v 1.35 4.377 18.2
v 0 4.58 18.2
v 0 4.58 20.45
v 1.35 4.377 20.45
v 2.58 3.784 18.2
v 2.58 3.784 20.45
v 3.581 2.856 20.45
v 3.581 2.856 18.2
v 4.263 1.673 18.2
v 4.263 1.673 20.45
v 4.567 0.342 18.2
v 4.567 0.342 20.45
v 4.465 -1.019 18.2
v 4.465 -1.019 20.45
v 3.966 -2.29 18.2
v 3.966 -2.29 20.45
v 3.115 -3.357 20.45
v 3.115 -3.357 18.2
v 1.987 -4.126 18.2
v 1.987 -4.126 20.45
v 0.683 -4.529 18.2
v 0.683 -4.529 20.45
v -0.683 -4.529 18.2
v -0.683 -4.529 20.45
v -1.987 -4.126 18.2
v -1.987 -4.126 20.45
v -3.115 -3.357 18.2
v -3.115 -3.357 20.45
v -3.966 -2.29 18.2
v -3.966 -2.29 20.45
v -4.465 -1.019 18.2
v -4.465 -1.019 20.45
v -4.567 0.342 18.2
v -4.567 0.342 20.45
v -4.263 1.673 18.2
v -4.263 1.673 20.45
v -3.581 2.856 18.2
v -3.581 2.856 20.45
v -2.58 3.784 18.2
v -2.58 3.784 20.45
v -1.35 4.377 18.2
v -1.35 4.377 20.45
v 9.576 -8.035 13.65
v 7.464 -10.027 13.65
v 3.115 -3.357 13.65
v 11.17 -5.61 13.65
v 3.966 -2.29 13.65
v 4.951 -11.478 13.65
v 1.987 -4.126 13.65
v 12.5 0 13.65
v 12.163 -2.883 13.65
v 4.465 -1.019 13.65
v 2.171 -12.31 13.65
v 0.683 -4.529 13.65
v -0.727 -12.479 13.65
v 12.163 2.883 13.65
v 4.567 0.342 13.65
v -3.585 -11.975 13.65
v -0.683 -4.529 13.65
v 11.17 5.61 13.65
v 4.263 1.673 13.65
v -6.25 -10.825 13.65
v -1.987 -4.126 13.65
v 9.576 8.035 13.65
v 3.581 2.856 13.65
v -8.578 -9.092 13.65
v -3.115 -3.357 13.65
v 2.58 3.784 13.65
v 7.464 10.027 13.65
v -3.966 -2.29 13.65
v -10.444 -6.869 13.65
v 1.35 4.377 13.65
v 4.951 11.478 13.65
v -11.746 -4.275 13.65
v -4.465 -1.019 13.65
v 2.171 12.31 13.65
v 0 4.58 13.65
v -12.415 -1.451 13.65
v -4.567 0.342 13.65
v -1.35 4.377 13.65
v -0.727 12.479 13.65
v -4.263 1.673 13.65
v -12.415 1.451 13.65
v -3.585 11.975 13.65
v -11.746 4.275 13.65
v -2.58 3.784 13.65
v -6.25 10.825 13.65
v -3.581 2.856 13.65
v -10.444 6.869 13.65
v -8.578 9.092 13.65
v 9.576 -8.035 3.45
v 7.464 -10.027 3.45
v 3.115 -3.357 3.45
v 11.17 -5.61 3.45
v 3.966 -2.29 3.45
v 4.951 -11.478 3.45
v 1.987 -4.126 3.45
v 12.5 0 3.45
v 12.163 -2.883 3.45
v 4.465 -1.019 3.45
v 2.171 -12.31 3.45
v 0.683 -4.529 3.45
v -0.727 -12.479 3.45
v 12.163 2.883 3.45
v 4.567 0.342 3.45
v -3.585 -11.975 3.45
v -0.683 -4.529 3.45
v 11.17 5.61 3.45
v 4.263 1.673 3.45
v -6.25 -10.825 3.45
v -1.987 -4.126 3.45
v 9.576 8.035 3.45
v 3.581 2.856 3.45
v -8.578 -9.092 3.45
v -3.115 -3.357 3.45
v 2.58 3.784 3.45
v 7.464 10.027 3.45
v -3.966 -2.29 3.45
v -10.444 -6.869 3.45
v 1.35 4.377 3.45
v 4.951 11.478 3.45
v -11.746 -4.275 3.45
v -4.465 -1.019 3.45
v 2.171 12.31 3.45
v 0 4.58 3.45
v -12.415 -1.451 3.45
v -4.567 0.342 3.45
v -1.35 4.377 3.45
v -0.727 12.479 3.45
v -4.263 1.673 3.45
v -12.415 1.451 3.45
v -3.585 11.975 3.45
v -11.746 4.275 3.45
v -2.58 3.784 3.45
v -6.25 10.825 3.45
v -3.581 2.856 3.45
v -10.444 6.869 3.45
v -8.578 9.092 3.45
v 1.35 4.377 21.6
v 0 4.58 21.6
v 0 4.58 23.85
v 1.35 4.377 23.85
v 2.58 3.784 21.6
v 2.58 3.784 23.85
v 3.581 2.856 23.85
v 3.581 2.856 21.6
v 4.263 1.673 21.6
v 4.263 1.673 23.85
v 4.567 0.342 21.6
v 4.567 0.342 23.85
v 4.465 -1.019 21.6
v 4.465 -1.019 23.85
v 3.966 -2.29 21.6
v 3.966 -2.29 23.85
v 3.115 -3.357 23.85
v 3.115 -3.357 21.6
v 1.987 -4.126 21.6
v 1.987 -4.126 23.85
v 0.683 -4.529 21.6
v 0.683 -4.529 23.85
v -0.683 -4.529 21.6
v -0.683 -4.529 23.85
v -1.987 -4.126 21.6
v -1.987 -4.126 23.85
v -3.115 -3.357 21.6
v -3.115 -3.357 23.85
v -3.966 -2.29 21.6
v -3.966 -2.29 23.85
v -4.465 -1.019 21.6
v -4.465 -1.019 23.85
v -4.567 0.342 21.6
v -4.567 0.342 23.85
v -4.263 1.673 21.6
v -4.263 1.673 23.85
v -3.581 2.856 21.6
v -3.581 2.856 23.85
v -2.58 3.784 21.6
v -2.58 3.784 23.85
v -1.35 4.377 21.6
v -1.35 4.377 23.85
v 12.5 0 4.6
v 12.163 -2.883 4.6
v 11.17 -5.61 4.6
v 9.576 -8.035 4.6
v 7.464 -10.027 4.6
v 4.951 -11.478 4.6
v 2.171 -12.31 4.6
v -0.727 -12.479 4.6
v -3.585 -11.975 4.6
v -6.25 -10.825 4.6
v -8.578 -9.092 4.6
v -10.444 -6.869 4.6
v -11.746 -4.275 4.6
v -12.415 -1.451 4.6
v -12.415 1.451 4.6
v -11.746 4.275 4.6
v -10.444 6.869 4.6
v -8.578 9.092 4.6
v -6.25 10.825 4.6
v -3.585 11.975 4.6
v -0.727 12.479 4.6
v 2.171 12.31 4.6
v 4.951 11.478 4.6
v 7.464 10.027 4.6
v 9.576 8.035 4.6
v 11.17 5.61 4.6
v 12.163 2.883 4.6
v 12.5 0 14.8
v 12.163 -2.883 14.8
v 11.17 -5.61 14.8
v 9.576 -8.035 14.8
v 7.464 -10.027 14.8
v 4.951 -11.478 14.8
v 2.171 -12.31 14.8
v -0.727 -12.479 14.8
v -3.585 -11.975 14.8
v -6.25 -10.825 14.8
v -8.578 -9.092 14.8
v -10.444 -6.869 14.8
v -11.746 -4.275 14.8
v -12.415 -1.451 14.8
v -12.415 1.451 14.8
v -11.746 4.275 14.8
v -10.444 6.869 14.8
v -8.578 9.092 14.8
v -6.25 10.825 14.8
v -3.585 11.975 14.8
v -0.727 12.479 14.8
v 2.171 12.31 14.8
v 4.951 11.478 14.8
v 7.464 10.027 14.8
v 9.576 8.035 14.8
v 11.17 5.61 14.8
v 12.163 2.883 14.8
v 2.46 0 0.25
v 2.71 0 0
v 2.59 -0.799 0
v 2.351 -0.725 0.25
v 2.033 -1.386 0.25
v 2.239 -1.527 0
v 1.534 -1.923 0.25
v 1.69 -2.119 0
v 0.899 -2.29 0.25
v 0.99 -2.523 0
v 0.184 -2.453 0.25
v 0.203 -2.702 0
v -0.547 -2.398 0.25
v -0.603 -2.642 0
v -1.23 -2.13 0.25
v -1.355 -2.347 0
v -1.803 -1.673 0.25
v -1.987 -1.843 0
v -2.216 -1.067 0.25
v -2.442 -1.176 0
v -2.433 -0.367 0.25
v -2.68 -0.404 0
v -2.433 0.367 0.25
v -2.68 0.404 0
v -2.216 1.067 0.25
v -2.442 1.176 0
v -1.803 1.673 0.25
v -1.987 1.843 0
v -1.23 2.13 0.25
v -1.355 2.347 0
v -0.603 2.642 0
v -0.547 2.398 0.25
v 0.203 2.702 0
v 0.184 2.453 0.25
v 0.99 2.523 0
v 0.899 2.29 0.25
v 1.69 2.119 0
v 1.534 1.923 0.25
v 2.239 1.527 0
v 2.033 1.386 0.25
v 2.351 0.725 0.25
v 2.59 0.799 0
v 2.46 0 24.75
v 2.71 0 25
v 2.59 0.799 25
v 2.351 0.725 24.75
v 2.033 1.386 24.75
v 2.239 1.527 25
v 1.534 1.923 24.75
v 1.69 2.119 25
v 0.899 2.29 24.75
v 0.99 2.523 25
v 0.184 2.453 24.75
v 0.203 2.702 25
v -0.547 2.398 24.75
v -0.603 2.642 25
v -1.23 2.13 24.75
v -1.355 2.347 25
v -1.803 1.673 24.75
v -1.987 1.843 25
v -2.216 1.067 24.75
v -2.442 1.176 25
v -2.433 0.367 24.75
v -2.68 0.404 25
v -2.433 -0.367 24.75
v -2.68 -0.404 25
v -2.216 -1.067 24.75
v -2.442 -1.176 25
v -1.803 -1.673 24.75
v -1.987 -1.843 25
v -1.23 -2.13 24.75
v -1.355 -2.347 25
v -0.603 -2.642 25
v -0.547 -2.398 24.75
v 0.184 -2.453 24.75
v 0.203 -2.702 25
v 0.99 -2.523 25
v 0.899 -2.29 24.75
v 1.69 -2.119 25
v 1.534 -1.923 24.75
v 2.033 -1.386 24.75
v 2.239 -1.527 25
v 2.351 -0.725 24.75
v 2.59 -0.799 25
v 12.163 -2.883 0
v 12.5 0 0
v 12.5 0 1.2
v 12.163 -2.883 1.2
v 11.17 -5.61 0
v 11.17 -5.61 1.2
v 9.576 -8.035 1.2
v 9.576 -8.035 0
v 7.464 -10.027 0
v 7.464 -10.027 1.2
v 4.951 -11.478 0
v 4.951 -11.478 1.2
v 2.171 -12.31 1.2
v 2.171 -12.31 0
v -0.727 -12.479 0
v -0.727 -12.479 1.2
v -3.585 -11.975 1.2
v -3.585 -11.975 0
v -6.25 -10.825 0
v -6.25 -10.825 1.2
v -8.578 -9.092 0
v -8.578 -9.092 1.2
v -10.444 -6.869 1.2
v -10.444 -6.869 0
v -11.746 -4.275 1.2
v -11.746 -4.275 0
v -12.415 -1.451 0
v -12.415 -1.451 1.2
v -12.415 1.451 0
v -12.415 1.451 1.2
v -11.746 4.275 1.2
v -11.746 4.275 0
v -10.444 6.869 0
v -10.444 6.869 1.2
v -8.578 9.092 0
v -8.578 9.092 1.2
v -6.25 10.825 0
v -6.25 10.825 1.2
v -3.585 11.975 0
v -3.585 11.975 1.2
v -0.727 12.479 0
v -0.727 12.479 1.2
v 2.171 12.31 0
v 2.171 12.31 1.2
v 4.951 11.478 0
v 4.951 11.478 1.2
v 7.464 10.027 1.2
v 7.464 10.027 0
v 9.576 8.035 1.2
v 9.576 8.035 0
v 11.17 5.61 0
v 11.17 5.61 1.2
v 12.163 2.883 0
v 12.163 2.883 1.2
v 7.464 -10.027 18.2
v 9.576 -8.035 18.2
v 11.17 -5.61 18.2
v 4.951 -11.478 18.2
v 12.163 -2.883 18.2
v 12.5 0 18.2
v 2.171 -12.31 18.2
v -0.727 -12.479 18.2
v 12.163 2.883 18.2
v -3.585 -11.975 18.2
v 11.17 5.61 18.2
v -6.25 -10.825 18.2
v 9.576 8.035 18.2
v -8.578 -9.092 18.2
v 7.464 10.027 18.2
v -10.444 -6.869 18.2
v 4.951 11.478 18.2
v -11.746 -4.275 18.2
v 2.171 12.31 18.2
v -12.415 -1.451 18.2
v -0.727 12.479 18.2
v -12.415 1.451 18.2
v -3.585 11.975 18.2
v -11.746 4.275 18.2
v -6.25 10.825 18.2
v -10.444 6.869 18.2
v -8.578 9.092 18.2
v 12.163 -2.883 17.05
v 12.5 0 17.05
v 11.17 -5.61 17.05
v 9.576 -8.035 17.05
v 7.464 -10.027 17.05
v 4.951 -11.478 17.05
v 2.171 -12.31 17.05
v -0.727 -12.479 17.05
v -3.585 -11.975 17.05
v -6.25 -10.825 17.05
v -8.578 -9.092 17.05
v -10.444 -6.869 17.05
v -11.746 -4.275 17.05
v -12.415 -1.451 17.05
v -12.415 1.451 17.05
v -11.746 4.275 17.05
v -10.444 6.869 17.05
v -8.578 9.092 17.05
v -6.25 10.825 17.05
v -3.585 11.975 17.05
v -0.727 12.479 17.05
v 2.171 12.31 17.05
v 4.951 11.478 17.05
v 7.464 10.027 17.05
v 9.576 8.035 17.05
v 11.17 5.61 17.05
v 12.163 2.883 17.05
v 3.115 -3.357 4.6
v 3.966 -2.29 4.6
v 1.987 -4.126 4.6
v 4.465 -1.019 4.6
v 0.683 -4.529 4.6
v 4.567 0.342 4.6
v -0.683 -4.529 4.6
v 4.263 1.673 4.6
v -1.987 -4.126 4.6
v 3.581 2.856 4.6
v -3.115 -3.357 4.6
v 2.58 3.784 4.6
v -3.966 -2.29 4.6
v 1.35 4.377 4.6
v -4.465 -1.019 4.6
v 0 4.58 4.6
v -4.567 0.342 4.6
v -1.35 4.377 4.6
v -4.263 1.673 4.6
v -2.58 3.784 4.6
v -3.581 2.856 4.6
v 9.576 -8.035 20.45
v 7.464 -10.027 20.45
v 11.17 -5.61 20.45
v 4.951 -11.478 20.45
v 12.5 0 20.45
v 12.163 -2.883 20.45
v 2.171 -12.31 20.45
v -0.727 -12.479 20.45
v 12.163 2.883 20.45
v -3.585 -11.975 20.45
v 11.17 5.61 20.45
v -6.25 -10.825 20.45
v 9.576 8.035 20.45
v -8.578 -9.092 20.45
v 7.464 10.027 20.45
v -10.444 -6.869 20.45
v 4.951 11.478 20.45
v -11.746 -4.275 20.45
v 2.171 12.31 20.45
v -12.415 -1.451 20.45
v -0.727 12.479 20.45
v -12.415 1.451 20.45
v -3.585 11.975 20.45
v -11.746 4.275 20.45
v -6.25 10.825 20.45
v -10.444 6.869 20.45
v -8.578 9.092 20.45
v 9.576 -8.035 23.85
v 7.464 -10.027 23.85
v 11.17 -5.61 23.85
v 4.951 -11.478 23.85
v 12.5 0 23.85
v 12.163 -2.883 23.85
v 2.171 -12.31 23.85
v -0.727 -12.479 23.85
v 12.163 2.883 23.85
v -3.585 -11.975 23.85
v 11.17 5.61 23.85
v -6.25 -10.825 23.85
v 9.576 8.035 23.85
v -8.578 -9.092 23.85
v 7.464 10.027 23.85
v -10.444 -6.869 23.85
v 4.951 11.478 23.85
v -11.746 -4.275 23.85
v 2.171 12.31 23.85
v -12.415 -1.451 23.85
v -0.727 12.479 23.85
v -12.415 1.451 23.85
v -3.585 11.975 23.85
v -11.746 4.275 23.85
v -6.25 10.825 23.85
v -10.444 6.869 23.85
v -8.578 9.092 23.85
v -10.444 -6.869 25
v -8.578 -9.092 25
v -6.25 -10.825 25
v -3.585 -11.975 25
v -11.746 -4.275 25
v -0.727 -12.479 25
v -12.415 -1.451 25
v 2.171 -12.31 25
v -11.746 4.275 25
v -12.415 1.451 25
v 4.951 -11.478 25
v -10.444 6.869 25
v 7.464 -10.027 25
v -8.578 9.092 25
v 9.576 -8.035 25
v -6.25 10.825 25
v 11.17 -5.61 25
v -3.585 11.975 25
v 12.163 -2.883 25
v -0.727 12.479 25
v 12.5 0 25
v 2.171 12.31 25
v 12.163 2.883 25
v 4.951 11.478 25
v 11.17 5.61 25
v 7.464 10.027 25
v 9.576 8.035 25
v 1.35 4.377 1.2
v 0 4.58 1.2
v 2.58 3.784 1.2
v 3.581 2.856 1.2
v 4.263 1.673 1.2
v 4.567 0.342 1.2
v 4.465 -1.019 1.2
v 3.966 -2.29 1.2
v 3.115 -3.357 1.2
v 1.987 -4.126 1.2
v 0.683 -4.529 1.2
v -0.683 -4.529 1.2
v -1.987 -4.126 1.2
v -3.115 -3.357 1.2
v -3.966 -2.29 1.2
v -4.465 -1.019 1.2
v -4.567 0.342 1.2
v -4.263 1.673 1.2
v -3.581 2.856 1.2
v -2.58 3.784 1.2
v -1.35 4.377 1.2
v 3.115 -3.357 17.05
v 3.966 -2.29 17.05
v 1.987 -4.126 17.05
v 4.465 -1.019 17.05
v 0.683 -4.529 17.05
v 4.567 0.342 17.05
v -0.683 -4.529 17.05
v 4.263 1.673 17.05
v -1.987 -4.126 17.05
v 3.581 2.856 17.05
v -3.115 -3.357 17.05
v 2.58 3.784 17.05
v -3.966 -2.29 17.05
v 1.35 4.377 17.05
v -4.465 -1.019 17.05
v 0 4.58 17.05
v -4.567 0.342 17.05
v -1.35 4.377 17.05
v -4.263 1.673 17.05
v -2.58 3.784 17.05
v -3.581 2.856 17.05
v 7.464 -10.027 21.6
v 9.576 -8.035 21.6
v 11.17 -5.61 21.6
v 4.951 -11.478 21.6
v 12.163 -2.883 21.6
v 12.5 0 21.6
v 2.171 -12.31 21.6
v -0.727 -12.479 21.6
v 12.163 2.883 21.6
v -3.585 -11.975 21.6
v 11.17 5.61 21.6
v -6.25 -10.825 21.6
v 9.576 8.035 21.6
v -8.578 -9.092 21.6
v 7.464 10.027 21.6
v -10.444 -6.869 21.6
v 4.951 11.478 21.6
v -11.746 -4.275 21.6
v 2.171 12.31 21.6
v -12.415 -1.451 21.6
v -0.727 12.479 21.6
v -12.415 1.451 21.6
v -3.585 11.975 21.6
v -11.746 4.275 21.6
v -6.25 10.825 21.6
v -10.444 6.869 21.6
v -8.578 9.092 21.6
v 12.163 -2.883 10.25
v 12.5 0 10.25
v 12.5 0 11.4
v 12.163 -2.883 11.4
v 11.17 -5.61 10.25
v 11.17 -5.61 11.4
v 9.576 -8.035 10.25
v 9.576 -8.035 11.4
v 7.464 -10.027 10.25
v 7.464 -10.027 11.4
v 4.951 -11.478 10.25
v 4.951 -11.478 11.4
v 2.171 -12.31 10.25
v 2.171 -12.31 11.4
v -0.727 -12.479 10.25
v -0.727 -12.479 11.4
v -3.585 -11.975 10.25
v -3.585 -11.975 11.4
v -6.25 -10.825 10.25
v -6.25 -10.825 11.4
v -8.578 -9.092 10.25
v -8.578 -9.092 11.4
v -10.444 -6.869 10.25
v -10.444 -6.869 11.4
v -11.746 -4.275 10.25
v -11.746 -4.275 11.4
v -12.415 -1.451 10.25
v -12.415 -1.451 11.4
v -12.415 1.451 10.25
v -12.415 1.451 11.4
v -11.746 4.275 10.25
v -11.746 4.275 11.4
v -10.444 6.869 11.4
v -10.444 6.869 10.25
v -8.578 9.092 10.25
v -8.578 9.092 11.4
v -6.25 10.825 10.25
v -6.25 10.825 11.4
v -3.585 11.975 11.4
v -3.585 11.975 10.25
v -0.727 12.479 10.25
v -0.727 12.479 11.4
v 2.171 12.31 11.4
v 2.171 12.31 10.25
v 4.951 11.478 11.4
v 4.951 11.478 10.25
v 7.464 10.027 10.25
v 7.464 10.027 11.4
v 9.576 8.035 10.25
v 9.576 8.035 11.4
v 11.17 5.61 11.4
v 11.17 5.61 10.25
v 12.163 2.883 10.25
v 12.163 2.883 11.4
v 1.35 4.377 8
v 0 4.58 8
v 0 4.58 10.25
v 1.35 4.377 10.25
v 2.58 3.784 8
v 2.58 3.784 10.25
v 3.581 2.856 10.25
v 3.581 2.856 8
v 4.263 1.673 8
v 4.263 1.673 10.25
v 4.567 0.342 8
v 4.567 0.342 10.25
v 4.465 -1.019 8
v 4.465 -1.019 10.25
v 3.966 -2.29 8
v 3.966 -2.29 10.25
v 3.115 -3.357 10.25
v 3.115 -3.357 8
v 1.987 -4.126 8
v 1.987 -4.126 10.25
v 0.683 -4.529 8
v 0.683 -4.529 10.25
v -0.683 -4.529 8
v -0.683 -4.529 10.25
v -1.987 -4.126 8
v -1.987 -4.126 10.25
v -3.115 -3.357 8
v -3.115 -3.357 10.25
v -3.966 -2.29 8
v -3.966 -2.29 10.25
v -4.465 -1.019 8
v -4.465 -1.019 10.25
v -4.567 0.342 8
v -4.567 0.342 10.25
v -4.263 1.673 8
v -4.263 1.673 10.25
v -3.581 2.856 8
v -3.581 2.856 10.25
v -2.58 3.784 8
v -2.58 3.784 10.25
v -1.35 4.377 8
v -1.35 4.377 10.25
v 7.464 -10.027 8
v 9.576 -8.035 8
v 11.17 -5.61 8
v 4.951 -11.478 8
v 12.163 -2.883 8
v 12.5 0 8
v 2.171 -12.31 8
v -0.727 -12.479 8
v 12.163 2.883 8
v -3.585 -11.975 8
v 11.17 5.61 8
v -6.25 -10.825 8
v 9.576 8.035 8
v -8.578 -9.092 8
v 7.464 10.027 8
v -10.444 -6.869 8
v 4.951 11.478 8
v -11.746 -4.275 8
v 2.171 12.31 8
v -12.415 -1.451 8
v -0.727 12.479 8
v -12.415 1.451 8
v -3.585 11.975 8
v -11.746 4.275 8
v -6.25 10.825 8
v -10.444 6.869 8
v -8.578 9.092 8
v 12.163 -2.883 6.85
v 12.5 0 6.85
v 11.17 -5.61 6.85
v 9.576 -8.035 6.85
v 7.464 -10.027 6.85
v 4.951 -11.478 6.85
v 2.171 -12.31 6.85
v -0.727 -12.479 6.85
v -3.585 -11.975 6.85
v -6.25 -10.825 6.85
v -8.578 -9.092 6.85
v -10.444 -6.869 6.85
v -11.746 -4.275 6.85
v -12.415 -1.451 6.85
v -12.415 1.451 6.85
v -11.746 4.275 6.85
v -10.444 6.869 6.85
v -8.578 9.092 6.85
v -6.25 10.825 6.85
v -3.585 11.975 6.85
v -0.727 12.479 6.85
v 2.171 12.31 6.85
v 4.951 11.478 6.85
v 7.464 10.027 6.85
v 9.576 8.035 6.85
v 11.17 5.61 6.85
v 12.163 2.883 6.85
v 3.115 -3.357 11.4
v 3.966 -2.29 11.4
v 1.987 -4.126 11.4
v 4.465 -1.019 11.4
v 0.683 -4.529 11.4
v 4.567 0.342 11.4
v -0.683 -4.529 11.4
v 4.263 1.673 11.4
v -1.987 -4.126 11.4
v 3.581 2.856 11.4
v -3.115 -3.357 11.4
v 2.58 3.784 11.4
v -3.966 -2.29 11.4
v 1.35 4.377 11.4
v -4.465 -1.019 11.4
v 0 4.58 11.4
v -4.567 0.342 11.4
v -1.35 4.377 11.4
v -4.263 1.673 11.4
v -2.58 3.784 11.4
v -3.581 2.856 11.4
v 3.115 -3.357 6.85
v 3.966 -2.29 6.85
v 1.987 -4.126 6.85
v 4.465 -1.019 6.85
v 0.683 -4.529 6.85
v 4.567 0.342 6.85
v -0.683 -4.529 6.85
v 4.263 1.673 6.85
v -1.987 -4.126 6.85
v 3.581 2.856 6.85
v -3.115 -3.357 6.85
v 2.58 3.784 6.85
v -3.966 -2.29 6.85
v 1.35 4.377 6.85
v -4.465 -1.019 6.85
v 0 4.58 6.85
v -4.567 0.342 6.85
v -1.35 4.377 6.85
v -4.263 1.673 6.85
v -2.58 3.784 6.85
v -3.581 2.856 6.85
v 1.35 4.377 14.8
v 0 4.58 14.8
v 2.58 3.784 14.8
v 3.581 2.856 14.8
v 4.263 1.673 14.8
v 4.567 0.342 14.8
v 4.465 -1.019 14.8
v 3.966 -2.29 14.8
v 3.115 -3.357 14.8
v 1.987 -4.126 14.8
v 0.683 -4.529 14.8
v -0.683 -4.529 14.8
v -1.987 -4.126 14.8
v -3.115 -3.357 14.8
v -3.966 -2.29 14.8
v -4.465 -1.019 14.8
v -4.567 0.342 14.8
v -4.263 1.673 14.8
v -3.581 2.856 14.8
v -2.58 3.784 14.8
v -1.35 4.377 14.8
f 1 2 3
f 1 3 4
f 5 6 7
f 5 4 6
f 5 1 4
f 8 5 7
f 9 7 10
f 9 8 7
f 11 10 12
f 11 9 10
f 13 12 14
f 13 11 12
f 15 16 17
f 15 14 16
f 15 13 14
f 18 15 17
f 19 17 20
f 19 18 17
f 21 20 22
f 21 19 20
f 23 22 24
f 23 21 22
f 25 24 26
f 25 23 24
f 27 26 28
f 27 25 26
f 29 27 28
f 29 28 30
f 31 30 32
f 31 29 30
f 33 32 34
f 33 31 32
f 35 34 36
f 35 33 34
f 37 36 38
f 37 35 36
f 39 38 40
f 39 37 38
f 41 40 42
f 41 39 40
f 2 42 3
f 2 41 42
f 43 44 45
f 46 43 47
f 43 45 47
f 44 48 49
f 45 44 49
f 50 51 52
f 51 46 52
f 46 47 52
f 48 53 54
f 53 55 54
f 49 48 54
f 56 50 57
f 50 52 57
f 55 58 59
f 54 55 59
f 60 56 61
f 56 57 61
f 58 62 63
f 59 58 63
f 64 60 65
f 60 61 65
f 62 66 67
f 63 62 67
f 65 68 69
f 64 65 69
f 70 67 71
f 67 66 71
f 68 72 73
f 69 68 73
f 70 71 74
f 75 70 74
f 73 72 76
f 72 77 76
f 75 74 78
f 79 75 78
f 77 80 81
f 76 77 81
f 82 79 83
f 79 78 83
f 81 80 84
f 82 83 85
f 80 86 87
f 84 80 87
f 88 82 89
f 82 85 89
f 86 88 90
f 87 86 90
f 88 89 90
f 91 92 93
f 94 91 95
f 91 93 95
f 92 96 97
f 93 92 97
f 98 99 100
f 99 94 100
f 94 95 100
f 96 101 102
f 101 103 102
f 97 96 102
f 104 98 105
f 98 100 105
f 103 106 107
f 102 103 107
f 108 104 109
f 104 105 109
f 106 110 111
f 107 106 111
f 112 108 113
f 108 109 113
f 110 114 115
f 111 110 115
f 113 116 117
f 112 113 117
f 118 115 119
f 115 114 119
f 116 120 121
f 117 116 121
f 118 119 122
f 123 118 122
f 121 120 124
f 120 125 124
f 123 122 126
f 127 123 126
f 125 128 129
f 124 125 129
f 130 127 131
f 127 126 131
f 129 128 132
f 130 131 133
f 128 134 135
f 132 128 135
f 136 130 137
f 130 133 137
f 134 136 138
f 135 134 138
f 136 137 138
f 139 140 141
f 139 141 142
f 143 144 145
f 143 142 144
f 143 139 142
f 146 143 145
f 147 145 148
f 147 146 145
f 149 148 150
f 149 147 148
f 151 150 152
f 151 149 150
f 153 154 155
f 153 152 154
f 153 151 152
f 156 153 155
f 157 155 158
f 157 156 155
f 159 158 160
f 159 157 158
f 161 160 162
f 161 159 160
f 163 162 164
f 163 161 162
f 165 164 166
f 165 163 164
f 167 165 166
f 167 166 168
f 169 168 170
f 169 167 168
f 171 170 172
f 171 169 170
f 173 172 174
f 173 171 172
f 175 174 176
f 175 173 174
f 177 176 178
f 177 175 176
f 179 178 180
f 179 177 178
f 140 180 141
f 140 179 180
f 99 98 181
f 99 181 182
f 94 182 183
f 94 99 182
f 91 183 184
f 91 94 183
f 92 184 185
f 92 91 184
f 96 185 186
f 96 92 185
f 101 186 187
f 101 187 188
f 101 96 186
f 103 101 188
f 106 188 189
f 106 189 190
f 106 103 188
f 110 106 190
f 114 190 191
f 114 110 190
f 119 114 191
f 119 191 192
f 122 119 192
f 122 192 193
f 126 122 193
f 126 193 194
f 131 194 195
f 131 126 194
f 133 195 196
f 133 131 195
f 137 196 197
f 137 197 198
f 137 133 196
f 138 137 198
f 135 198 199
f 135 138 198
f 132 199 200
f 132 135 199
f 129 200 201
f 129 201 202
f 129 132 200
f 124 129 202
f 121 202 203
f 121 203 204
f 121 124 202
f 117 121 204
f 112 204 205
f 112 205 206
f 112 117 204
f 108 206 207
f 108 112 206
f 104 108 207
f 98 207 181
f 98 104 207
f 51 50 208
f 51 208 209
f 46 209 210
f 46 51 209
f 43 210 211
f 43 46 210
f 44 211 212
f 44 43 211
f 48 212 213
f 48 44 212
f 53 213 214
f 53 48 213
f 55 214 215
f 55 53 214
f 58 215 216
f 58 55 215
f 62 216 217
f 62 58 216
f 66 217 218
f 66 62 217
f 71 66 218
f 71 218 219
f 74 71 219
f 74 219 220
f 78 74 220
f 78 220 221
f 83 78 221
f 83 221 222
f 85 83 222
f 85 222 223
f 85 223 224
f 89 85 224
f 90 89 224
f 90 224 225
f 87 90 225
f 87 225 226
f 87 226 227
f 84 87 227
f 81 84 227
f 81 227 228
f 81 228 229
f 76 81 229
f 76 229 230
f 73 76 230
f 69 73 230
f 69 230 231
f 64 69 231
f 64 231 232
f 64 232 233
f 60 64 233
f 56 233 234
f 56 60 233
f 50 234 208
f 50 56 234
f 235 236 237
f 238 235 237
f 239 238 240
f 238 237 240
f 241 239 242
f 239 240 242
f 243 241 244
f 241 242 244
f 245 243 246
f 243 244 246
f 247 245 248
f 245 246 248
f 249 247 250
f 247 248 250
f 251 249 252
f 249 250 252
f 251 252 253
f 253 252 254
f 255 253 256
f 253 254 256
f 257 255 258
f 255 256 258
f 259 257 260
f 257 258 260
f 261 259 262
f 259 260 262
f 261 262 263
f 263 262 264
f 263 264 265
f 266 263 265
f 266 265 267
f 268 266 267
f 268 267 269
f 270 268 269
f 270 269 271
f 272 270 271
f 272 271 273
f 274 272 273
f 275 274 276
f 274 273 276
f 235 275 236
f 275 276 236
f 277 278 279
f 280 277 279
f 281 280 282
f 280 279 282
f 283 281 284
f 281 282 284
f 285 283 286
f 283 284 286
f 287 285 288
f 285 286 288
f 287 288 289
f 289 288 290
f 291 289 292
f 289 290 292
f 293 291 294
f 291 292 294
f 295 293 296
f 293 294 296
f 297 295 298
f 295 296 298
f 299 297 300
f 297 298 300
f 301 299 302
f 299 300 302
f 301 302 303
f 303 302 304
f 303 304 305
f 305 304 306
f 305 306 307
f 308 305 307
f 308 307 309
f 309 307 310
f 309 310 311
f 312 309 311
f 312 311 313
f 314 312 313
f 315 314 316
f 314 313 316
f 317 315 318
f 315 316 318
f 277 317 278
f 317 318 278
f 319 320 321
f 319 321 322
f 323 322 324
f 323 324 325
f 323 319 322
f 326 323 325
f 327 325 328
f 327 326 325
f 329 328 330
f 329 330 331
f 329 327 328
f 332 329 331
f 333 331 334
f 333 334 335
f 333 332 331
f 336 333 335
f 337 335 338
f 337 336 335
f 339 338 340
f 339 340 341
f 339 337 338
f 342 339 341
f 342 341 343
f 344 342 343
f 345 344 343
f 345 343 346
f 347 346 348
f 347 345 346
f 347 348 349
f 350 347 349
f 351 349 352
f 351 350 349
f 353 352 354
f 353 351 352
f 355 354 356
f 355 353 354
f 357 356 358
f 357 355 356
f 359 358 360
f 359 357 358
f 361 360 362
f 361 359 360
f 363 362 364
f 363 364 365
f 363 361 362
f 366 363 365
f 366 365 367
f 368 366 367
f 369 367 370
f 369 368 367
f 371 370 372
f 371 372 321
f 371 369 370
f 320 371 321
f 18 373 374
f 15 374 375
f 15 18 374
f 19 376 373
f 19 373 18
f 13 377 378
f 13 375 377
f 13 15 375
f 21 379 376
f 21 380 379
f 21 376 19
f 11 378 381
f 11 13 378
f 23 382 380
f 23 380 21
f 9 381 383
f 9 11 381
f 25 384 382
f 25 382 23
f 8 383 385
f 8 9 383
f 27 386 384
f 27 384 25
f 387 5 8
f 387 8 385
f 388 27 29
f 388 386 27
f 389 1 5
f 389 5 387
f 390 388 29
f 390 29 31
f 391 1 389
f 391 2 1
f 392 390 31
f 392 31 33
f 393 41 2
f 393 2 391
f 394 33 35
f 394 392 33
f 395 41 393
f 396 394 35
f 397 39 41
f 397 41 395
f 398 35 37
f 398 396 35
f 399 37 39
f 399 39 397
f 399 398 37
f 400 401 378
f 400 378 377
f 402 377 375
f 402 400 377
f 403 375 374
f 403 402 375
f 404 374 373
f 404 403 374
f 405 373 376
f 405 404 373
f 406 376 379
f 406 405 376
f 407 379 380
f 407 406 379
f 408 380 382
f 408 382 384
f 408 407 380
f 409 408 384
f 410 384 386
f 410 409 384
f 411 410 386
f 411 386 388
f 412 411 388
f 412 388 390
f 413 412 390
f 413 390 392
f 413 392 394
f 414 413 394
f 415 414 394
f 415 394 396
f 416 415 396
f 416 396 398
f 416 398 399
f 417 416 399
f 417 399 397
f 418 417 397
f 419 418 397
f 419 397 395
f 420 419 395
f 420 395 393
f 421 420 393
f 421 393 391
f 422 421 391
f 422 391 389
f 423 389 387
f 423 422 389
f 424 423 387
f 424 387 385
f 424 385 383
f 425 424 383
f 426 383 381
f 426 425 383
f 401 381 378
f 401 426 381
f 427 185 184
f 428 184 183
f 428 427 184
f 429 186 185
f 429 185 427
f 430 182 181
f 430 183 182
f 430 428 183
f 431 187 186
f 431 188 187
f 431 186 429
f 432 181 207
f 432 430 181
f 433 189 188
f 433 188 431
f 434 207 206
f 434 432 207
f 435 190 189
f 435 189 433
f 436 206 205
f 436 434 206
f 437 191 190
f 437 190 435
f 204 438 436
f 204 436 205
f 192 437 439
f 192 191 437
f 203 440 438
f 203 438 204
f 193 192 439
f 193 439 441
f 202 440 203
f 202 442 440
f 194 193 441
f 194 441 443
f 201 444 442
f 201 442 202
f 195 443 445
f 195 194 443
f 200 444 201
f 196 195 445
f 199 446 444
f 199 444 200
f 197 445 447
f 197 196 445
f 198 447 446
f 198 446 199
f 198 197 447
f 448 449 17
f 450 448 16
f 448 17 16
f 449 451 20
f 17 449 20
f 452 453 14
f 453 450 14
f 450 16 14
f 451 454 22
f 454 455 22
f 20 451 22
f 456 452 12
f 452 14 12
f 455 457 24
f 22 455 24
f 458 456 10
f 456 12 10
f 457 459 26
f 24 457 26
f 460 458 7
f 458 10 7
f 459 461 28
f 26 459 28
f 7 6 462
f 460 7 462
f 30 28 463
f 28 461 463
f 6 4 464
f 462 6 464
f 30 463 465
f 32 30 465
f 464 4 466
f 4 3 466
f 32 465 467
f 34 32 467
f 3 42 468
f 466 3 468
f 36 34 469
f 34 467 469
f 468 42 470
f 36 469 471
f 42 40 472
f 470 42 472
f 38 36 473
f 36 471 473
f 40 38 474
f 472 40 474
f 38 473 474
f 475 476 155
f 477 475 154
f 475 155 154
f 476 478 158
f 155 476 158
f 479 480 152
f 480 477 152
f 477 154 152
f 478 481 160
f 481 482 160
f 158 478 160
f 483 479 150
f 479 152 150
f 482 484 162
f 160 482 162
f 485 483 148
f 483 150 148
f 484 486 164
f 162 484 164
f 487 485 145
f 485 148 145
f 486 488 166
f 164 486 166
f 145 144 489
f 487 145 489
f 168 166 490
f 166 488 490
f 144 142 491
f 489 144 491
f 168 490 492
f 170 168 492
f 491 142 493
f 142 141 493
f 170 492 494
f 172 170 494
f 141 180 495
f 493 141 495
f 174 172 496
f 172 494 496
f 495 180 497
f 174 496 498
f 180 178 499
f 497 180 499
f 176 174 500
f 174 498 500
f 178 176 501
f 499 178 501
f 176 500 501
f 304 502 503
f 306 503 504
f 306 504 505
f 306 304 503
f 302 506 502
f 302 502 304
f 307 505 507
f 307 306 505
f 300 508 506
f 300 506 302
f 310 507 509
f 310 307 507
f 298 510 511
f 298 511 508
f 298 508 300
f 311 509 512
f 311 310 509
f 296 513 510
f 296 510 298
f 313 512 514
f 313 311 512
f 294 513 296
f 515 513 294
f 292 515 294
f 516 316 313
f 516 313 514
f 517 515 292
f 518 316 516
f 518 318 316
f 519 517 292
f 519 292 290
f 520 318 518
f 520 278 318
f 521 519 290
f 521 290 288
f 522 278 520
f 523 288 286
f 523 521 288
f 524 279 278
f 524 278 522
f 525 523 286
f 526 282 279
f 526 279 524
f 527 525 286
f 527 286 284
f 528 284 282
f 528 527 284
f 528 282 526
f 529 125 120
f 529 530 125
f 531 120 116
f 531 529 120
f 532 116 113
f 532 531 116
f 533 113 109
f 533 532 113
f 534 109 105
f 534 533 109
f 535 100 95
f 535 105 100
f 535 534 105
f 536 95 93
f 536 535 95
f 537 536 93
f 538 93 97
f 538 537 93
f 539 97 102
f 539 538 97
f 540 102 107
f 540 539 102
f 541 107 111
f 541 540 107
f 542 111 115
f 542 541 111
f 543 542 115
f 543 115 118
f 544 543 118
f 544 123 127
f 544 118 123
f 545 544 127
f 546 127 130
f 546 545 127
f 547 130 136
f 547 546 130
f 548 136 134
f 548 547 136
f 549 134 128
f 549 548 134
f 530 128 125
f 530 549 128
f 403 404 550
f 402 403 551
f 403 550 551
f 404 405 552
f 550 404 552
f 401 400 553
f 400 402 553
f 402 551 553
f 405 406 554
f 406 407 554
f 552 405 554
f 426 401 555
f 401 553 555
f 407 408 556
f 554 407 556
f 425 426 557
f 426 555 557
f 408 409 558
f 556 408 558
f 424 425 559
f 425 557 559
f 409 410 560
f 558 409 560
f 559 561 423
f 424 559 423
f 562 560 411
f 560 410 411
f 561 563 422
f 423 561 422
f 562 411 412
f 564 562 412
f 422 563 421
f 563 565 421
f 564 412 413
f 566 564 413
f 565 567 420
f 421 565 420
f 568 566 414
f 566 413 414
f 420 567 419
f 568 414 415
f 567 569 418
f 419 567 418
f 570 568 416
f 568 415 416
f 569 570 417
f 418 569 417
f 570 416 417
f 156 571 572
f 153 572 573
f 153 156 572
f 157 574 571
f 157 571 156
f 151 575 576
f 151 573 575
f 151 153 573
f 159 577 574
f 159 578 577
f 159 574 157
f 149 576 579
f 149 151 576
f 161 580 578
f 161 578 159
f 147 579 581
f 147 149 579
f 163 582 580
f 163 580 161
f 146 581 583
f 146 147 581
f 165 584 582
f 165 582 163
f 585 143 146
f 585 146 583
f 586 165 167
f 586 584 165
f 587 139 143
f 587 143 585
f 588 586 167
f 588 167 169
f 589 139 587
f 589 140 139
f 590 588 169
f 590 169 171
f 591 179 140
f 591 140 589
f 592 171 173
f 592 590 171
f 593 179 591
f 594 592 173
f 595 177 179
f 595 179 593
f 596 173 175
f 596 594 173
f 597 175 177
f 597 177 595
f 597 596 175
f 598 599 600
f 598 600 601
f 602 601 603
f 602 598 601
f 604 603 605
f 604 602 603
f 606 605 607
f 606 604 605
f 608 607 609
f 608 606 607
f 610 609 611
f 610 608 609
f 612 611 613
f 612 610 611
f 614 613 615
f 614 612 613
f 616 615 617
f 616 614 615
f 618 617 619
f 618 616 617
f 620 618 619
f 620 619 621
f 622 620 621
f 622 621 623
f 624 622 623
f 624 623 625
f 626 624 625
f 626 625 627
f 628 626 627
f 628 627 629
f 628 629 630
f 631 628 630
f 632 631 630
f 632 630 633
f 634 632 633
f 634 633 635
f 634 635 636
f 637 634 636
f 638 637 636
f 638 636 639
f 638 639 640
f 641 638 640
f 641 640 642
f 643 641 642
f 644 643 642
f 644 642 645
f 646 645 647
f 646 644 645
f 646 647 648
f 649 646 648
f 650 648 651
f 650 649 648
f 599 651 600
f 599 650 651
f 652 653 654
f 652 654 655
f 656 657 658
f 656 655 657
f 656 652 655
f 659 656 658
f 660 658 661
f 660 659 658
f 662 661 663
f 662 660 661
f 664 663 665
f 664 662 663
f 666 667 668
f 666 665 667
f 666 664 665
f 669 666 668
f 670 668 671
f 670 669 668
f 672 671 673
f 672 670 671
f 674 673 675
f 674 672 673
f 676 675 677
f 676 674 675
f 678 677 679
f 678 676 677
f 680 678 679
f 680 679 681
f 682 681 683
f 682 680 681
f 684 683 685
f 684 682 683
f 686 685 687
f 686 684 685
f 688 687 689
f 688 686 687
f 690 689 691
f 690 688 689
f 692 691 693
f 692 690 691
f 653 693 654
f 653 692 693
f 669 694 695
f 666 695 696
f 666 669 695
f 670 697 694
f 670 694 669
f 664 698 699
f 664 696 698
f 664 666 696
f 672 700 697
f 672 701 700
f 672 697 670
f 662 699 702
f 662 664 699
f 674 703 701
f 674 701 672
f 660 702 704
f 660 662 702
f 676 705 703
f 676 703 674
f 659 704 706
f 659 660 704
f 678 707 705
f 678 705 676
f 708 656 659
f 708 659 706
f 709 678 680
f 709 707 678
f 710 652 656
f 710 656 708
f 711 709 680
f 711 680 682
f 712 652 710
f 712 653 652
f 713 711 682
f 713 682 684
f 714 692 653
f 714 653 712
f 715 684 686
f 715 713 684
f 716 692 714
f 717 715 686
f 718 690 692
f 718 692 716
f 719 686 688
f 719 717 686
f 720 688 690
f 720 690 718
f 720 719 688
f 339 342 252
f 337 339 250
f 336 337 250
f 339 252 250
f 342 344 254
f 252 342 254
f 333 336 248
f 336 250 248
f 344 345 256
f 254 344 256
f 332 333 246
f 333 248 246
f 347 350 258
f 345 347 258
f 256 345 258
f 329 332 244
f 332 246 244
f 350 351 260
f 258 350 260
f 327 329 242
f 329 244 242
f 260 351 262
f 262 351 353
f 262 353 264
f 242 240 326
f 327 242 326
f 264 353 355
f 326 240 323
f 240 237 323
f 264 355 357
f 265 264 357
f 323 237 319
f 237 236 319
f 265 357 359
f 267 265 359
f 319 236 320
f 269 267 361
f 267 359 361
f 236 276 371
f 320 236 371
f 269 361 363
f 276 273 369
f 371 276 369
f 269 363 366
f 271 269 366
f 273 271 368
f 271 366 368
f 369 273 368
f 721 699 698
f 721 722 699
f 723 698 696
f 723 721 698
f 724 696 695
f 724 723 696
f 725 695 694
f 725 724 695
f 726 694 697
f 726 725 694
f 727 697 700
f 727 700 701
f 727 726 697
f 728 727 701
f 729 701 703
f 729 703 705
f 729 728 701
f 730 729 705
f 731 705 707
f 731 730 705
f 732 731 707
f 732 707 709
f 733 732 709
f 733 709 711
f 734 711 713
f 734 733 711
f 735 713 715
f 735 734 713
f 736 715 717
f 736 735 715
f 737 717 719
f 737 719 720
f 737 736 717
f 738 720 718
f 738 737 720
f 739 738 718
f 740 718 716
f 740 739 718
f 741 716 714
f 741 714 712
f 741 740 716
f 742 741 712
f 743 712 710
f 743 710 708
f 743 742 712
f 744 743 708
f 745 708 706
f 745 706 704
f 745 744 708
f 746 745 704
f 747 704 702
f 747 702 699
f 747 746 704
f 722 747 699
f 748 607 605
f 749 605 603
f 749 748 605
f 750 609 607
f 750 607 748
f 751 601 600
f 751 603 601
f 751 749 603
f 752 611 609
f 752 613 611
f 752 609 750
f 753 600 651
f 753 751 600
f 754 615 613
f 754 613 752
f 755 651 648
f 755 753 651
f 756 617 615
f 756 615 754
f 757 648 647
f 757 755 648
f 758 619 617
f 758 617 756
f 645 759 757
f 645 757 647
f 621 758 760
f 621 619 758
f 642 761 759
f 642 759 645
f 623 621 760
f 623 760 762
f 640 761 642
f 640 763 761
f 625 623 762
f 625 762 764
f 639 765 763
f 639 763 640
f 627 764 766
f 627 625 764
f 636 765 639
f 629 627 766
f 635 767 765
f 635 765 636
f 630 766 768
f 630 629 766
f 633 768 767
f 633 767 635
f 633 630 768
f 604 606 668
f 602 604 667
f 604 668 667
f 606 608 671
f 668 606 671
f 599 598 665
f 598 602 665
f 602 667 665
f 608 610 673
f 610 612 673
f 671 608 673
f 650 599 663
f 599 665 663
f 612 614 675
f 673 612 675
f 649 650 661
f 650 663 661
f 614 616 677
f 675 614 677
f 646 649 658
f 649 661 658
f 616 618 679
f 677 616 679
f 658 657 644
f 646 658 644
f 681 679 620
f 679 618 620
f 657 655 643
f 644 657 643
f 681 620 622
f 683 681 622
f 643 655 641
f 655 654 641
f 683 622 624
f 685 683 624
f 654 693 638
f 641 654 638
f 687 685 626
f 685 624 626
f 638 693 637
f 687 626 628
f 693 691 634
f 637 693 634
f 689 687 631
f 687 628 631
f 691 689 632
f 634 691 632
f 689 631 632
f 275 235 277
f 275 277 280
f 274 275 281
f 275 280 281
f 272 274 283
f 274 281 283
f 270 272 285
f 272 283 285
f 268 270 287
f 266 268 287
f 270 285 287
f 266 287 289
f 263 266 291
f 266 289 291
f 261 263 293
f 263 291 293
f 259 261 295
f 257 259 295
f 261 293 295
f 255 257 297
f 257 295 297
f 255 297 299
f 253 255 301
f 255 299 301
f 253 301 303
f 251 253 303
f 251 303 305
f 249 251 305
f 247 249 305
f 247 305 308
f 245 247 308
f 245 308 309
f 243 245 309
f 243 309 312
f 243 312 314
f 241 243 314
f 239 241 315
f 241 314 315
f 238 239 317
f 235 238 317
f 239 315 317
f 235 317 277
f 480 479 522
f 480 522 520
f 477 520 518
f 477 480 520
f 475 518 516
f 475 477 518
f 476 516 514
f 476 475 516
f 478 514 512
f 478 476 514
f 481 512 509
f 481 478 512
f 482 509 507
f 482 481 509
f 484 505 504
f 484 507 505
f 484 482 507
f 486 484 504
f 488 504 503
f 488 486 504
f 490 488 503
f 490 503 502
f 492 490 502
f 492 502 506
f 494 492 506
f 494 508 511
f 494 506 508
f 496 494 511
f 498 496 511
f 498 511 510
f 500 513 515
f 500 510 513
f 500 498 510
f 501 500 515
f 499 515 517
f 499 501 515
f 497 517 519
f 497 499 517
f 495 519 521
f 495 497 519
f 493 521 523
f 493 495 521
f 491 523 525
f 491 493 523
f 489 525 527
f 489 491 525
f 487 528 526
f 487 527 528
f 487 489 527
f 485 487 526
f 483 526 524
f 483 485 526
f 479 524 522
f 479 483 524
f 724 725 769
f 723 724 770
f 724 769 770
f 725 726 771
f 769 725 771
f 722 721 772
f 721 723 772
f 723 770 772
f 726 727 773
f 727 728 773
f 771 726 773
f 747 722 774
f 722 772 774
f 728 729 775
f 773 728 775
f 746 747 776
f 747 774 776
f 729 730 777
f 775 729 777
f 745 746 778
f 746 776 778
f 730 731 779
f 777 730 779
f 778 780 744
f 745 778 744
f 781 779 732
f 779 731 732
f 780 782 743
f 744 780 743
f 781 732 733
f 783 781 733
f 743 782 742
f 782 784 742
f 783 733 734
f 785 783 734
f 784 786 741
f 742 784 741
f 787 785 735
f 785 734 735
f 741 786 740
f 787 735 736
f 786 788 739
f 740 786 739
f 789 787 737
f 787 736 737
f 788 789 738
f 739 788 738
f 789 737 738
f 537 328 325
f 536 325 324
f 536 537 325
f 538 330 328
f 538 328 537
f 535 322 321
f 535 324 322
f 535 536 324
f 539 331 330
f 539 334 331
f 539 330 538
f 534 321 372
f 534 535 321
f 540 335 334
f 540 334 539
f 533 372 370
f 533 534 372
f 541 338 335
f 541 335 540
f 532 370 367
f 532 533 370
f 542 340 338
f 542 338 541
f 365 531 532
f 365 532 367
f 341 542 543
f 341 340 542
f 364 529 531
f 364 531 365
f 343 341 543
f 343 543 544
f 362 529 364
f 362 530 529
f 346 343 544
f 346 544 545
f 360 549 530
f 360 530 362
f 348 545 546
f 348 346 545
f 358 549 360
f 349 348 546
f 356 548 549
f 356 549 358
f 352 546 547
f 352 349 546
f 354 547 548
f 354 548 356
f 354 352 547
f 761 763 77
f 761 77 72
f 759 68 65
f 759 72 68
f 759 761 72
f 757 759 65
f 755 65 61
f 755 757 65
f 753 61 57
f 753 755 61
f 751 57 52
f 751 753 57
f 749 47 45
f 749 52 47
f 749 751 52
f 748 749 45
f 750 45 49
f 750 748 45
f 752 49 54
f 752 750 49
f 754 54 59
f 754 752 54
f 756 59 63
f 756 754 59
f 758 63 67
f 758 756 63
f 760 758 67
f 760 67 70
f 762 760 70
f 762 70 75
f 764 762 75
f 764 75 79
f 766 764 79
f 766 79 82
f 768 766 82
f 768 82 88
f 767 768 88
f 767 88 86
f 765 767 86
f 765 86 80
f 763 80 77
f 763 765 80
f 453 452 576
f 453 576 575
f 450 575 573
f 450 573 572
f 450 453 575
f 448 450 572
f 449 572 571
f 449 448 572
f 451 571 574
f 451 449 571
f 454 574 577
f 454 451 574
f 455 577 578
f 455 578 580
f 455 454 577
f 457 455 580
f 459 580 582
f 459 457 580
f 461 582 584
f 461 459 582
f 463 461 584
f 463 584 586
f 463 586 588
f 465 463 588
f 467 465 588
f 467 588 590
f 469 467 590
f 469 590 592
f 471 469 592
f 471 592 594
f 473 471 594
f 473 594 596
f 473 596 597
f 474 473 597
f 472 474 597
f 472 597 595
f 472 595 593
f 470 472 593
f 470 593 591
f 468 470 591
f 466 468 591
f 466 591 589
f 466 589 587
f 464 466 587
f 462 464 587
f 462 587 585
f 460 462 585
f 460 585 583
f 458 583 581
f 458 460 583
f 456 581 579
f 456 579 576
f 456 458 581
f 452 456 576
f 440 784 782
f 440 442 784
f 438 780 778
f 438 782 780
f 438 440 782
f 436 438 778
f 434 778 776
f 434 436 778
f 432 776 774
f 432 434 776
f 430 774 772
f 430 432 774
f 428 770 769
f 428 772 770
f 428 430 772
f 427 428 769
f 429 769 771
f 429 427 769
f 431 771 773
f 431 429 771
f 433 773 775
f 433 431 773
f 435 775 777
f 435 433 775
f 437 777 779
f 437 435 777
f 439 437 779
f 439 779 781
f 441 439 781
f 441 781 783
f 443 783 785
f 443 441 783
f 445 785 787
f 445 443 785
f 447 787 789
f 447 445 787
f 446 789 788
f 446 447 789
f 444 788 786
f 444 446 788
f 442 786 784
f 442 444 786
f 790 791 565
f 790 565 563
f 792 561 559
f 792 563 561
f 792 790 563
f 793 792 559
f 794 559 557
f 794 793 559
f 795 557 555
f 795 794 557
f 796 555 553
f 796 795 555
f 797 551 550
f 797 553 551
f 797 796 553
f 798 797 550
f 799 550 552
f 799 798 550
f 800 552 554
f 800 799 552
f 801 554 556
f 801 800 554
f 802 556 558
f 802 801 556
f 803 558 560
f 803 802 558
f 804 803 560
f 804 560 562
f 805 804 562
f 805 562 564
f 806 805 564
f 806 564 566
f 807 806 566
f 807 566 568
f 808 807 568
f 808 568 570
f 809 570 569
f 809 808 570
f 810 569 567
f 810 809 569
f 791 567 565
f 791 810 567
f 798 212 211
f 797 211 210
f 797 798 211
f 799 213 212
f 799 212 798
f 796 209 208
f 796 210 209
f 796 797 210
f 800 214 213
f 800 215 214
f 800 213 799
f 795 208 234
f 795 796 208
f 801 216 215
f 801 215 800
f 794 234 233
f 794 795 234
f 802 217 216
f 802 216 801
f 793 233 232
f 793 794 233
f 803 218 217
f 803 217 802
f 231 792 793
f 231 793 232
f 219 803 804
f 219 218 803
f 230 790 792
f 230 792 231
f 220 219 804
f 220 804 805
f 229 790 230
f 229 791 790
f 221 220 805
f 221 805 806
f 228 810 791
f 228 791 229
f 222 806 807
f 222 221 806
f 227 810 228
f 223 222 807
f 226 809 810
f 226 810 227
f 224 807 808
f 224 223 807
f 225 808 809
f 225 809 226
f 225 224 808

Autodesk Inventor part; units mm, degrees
ref_plane "YZ Plane" through (0, 0, 0) normal (1, 0, 0) x (0, 1, 0)
ref_plane "XZ Plane" through (0, 0, 0) normal (0, 1, 0) x (-1, 0, 0)
ref_plane "XY Plane" through (0, 0, 0) normal (0, 0, 1) x (1, 0, 0)
sketch "Sketch1" plane through (0, 0, 0) normal (0, 0, 1) x (1, 0, 0)
  circle A0 centre (0, 0) radius 12.5
  dimension "d0" = 25
extrude "Extrusion1" add sketch "Sketch1" along normal blind 25
sketch "Sketch2" plane through (0, 0, 0) normal (1, 0, 0) x (0, 1, 0)
  line L0 (0, 0) -> (0, 24.8569) construction
  line L1 (12.5, 0) -> (12.5, 25) projected
  line L2 (12.5, 23.85) -> (4.58, 23.85)
  line L3 (4.58, 23.85) -> (4.58, 21.6)
  line L4 (4.58, 21.6) -> (12.5, 21.6)
  line L5 (12.5, 21.6) -> (12.5, 23.85)
  line L6 (12.5, 25) -> (-12.5, 25) projected
  line L7 (12.5, 20.45) -> (4.58, 20.45)
  line L8 (4.58, 20.45) -> (4.58, 18.2)
  line L9 (4.58, 18.2) -> (12.5, 18.2)
  line L10 (12.5, 18.2) -> (12.5, 20.45)
  line L11 (12.5, 17.05) -> (4.58, 17.05)
  line L12 (4.58, 17.05) -> (4.58, 14.8)
  line L13 (4.58, 14.8) -> (12.5, 14.8)
  line L14 (12.5, 14.8) -> (12.5, 17.05)
  line L15 (12.5, 13.65) -> (4.58, 13.65)
  line L16 (4.58, 13.65) -> (4.58, 11.4)
  line L17 (4.58, 11.4) -> (12.5, 11.4)
  line L18 (12.5, 11.4) -> (12.5, 13.65)
  line L19 (12.5, 10.25) -> (4.58, 10.25)
  line L20 (4.58, 10.25) -> (4.58, 8)
  line L21 (4.58, 8) -> (12.5, 8)
  line L22 (12.5, 8) -> (12.5, 10.25)
  line L23 (12.5, 6.85) -> (4.58, 6.85)
  line L24 (4.58, 6.85) -> (4.58, 4.6)
  line L25 (4.58, 4.6) -> (12.5, 4.6)
  line L26 (12.5, 4.6) -> (12.5, 6.85)
  line L27 (12.5, 3.45) -> (4.58, 3.45)
  line L28 (4.58, 3.45) -> (4.58, 1.2)
  line L29 (4.58, 1.2) -> (12.5, 1.2)
  line L30 (12.5, 1.2) -> (12.5, 3.45)
  dimension "d3" = 2.25
  dimension "d4" = 1.15
  dimension "d5" = 7.92
  dimension "d8" = 3.4
revolve "Revolution1" cut sketch "Sketch2" angle 360 about axis through (0, 0, 0) along (0, 0, 1)
sketch "Sketch3" plane through (0, 0, 25) normal (0, 0, 1) x (1, 0, 0)
  circle A0 centre (0, 0) radius 2.46
  dimension "d14" = 4.92
extrude "Extrusion2" cut sketch "Sketch3" against normal through all
thread "Thread1" size "M5x0.8" class "6H" standard "ANSI Metric M Profile" full length
chamfer "Chamfer1" distance 0.25 angle 45 1 edges at (-2.46, 0, 25)
chamfer "Chamfer2" distance 0.25 angle 45 1 edges at (-2.46, 0, 0)
properties part number "Cooling fin" material "Aluminum 5005-H18"
